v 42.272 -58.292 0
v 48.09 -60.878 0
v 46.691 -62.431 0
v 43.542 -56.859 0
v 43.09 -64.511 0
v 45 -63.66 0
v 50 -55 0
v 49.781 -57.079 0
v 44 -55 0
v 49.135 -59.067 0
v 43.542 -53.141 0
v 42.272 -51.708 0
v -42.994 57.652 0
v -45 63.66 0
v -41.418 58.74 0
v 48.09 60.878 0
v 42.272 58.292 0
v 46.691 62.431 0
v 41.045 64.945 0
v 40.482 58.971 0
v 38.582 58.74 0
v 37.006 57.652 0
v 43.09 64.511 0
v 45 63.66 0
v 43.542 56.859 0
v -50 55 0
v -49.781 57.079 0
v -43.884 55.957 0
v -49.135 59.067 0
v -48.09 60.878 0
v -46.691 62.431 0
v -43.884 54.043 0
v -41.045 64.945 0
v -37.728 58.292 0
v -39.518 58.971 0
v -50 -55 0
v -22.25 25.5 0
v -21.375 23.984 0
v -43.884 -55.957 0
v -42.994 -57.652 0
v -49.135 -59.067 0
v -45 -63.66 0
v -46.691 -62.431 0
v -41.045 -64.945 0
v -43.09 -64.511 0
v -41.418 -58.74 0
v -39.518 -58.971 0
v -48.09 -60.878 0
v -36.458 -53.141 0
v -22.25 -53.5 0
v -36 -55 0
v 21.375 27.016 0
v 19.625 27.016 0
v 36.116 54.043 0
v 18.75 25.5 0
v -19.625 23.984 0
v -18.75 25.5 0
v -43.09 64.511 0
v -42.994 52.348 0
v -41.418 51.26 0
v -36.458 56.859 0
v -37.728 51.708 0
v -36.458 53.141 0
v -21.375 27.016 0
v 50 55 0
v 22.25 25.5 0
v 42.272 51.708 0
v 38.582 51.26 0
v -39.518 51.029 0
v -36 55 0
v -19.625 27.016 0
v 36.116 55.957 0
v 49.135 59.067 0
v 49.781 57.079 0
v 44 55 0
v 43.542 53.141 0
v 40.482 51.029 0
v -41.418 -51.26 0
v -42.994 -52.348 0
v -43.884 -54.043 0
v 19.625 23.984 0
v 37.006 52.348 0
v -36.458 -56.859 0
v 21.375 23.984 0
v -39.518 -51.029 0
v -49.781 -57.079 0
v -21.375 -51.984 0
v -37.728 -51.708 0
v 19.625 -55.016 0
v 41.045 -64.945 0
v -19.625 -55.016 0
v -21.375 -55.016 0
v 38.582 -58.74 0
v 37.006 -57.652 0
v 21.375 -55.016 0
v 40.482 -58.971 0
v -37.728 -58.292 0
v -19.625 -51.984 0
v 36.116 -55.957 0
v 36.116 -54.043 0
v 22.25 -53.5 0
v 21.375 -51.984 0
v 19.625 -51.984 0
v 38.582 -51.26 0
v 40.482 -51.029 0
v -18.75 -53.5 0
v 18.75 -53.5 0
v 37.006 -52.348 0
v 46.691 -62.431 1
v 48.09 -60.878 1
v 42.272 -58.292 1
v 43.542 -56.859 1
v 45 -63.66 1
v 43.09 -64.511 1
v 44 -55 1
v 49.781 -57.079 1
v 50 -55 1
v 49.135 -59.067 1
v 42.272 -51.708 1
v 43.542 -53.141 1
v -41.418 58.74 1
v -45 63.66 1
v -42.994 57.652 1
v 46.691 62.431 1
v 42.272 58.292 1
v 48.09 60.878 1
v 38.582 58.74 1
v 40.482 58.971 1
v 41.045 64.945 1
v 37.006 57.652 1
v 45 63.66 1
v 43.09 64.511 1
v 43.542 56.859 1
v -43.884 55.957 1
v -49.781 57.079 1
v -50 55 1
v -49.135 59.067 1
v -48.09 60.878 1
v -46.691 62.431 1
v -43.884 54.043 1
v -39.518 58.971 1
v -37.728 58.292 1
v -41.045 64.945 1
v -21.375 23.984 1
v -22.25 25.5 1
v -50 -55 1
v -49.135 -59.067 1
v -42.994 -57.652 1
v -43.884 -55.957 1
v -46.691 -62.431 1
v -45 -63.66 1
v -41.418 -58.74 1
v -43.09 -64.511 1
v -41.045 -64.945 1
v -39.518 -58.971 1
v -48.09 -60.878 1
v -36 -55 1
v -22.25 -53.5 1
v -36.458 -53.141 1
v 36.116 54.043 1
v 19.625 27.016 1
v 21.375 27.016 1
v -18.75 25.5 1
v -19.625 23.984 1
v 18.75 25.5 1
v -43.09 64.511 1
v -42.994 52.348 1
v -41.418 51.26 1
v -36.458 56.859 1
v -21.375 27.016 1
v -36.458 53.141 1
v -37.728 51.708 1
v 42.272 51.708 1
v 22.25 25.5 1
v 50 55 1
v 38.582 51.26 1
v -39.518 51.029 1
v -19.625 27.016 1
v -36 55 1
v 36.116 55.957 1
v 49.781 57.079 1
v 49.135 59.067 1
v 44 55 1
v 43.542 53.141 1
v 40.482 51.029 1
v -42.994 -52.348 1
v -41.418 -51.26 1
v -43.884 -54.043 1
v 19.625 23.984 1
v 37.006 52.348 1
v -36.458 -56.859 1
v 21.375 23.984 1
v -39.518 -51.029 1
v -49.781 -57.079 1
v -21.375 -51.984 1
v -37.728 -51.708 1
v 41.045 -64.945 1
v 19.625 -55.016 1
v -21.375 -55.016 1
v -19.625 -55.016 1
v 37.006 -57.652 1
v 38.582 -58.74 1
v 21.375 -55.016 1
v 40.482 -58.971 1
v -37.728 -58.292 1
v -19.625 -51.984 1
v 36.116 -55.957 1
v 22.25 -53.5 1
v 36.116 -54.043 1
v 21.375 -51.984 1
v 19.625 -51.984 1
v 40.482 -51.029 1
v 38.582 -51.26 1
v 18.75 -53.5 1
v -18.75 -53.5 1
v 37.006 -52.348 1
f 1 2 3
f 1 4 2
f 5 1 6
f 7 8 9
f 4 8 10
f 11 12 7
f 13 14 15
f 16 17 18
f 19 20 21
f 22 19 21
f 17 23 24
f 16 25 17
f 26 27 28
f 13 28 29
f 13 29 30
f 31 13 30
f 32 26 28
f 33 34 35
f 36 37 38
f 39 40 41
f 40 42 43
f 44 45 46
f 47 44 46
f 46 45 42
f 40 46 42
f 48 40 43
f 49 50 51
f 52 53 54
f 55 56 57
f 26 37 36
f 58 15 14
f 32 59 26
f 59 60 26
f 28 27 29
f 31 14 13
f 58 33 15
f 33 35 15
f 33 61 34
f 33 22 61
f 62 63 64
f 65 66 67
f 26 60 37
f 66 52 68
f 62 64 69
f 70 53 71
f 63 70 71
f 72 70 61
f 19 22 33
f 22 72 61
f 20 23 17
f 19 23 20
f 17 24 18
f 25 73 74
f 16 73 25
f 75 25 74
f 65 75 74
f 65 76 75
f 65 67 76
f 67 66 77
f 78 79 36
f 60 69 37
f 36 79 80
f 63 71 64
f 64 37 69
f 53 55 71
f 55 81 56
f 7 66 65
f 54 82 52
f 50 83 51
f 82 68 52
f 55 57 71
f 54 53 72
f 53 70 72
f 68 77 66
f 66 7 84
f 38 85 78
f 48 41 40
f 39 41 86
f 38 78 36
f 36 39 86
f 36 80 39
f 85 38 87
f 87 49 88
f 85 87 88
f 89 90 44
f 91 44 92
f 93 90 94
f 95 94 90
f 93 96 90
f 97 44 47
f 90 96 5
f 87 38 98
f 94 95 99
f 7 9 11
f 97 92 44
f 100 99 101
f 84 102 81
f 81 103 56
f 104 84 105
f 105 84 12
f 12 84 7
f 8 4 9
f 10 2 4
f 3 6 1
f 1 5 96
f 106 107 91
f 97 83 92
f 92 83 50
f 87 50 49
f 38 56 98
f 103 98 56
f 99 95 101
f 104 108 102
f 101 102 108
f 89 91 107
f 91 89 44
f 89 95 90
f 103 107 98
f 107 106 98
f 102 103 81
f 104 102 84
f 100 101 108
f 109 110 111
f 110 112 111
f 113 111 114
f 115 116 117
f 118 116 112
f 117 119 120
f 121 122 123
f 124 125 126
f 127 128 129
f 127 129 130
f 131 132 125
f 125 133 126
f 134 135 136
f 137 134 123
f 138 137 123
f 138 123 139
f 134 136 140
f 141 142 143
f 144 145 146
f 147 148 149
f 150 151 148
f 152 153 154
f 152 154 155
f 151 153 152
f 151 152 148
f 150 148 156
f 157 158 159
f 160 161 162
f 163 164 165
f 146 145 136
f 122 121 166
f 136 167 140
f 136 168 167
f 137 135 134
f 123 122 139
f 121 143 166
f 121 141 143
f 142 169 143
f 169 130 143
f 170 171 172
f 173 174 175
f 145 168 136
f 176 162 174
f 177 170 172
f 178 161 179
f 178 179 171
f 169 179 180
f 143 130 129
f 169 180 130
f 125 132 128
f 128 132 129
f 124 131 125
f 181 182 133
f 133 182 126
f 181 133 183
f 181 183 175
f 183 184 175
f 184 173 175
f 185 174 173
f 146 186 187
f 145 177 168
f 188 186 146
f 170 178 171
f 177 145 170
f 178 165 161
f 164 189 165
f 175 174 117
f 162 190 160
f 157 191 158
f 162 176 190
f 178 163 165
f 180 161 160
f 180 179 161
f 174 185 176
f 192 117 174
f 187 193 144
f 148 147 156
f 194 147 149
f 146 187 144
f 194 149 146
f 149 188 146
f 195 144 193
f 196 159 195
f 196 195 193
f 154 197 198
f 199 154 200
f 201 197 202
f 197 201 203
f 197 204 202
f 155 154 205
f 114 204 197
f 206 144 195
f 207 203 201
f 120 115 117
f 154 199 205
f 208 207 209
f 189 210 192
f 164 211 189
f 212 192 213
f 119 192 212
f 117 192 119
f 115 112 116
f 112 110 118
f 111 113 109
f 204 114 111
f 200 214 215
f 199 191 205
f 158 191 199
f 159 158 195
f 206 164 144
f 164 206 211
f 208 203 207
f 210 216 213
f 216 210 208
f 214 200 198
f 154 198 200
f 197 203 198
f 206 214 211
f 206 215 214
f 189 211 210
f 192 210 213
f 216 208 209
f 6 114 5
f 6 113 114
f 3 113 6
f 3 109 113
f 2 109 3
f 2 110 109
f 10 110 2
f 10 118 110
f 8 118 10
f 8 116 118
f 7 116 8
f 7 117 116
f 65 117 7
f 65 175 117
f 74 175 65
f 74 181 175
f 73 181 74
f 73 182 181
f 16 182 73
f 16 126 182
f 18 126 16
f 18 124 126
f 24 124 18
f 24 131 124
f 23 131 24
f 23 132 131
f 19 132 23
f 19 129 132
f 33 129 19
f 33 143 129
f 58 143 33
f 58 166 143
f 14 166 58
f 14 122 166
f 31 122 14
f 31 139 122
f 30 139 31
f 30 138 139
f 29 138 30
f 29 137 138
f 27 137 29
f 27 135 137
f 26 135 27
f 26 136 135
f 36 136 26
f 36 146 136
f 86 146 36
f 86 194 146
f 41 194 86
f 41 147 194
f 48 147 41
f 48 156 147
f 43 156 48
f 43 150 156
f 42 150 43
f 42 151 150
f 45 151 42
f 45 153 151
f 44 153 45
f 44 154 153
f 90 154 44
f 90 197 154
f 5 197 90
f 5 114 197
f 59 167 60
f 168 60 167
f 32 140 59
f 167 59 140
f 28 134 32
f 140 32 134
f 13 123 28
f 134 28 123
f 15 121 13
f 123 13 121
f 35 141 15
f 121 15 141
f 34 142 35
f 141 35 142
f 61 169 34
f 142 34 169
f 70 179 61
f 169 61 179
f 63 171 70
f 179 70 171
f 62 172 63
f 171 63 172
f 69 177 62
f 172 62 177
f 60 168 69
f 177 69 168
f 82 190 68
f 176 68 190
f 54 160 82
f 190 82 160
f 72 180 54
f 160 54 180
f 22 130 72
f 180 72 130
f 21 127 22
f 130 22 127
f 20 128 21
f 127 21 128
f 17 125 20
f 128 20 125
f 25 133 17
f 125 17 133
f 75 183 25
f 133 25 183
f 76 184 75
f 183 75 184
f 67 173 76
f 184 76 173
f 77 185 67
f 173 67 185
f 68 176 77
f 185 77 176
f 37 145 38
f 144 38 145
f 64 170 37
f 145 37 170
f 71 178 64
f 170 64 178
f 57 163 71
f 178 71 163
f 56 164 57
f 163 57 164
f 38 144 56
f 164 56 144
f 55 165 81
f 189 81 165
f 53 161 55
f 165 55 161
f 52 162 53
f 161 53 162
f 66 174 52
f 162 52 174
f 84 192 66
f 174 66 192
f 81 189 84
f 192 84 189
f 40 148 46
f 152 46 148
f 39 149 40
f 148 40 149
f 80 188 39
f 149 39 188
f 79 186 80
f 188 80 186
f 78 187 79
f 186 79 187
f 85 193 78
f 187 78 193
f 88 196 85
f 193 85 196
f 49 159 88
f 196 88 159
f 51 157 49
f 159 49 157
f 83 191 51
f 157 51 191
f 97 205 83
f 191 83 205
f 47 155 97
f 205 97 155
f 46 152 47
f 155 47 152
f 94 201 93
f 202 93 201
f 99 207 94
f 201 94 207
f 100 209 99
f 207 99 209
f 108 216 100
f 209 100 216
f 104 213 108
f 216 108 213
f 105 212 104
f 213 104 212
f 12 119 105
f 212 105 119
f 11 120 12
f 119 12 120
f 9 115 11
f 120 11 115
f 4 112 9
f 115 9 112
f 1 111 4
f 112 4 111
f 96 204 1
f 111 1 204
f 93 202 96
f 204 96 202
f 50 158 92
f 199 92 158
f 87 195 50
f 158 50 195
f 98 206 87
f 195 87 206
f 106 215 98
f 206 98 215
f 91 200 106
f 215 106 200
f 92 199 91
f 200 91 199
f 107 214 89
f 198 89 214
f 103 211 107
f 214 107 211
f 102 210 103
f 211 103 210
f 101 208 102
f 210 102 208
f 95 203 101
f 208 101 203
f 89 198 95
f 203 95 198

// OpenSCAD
// file: config.scad
vesc_offset = [0, -14];
vesc_mounting_hole_centres = [41, 79];
vesc_mounting_hole_diameter = 3.5;

plate_mounting_hole_centres = [80, 110];
plate_mounting_hole_diameter = 8;

plate_dimensions = [100, 130];
plate_thickness = 1;
// file: plate.scad
include <config.scad>;

module RoundedRect(dimensions, radius=10)
{
  d = radius * 2;

  minkowski()
  {
    square(dimensions - [d, d], center=true);
    circle(d=d);
  }
}

module PlaceMountingHoles(centres, diameter)
{
  lx = centres[0] / 2;
  ly = centres[1] / 2;

  for (x = [-lx, lx])
  {
    for (y = [-ly, ly])
    {
      translate([x, y])
      {
        circle(d=diameter);
      }
    }
  }
}

module Plate()
{
  difference()
  {
    RoundedRect(plate_dimensions);

    PlaceMountingHoles(plate_mounting_hole_centres, plate_mounting_hole_diameter);

    translate(vesc_offset)
    {
      PlaceMountingHoles(vesc_mounting_hole_centres, vesc_mounting_hole_diameter);
    }
  }
}

Plate();
// main file
use <plate.scad>;
include <config.scad>;

module Plate3D()
{
  linear_extrude(plate_thickness)
  {
    Plate();
  }
}

Plate3D();
